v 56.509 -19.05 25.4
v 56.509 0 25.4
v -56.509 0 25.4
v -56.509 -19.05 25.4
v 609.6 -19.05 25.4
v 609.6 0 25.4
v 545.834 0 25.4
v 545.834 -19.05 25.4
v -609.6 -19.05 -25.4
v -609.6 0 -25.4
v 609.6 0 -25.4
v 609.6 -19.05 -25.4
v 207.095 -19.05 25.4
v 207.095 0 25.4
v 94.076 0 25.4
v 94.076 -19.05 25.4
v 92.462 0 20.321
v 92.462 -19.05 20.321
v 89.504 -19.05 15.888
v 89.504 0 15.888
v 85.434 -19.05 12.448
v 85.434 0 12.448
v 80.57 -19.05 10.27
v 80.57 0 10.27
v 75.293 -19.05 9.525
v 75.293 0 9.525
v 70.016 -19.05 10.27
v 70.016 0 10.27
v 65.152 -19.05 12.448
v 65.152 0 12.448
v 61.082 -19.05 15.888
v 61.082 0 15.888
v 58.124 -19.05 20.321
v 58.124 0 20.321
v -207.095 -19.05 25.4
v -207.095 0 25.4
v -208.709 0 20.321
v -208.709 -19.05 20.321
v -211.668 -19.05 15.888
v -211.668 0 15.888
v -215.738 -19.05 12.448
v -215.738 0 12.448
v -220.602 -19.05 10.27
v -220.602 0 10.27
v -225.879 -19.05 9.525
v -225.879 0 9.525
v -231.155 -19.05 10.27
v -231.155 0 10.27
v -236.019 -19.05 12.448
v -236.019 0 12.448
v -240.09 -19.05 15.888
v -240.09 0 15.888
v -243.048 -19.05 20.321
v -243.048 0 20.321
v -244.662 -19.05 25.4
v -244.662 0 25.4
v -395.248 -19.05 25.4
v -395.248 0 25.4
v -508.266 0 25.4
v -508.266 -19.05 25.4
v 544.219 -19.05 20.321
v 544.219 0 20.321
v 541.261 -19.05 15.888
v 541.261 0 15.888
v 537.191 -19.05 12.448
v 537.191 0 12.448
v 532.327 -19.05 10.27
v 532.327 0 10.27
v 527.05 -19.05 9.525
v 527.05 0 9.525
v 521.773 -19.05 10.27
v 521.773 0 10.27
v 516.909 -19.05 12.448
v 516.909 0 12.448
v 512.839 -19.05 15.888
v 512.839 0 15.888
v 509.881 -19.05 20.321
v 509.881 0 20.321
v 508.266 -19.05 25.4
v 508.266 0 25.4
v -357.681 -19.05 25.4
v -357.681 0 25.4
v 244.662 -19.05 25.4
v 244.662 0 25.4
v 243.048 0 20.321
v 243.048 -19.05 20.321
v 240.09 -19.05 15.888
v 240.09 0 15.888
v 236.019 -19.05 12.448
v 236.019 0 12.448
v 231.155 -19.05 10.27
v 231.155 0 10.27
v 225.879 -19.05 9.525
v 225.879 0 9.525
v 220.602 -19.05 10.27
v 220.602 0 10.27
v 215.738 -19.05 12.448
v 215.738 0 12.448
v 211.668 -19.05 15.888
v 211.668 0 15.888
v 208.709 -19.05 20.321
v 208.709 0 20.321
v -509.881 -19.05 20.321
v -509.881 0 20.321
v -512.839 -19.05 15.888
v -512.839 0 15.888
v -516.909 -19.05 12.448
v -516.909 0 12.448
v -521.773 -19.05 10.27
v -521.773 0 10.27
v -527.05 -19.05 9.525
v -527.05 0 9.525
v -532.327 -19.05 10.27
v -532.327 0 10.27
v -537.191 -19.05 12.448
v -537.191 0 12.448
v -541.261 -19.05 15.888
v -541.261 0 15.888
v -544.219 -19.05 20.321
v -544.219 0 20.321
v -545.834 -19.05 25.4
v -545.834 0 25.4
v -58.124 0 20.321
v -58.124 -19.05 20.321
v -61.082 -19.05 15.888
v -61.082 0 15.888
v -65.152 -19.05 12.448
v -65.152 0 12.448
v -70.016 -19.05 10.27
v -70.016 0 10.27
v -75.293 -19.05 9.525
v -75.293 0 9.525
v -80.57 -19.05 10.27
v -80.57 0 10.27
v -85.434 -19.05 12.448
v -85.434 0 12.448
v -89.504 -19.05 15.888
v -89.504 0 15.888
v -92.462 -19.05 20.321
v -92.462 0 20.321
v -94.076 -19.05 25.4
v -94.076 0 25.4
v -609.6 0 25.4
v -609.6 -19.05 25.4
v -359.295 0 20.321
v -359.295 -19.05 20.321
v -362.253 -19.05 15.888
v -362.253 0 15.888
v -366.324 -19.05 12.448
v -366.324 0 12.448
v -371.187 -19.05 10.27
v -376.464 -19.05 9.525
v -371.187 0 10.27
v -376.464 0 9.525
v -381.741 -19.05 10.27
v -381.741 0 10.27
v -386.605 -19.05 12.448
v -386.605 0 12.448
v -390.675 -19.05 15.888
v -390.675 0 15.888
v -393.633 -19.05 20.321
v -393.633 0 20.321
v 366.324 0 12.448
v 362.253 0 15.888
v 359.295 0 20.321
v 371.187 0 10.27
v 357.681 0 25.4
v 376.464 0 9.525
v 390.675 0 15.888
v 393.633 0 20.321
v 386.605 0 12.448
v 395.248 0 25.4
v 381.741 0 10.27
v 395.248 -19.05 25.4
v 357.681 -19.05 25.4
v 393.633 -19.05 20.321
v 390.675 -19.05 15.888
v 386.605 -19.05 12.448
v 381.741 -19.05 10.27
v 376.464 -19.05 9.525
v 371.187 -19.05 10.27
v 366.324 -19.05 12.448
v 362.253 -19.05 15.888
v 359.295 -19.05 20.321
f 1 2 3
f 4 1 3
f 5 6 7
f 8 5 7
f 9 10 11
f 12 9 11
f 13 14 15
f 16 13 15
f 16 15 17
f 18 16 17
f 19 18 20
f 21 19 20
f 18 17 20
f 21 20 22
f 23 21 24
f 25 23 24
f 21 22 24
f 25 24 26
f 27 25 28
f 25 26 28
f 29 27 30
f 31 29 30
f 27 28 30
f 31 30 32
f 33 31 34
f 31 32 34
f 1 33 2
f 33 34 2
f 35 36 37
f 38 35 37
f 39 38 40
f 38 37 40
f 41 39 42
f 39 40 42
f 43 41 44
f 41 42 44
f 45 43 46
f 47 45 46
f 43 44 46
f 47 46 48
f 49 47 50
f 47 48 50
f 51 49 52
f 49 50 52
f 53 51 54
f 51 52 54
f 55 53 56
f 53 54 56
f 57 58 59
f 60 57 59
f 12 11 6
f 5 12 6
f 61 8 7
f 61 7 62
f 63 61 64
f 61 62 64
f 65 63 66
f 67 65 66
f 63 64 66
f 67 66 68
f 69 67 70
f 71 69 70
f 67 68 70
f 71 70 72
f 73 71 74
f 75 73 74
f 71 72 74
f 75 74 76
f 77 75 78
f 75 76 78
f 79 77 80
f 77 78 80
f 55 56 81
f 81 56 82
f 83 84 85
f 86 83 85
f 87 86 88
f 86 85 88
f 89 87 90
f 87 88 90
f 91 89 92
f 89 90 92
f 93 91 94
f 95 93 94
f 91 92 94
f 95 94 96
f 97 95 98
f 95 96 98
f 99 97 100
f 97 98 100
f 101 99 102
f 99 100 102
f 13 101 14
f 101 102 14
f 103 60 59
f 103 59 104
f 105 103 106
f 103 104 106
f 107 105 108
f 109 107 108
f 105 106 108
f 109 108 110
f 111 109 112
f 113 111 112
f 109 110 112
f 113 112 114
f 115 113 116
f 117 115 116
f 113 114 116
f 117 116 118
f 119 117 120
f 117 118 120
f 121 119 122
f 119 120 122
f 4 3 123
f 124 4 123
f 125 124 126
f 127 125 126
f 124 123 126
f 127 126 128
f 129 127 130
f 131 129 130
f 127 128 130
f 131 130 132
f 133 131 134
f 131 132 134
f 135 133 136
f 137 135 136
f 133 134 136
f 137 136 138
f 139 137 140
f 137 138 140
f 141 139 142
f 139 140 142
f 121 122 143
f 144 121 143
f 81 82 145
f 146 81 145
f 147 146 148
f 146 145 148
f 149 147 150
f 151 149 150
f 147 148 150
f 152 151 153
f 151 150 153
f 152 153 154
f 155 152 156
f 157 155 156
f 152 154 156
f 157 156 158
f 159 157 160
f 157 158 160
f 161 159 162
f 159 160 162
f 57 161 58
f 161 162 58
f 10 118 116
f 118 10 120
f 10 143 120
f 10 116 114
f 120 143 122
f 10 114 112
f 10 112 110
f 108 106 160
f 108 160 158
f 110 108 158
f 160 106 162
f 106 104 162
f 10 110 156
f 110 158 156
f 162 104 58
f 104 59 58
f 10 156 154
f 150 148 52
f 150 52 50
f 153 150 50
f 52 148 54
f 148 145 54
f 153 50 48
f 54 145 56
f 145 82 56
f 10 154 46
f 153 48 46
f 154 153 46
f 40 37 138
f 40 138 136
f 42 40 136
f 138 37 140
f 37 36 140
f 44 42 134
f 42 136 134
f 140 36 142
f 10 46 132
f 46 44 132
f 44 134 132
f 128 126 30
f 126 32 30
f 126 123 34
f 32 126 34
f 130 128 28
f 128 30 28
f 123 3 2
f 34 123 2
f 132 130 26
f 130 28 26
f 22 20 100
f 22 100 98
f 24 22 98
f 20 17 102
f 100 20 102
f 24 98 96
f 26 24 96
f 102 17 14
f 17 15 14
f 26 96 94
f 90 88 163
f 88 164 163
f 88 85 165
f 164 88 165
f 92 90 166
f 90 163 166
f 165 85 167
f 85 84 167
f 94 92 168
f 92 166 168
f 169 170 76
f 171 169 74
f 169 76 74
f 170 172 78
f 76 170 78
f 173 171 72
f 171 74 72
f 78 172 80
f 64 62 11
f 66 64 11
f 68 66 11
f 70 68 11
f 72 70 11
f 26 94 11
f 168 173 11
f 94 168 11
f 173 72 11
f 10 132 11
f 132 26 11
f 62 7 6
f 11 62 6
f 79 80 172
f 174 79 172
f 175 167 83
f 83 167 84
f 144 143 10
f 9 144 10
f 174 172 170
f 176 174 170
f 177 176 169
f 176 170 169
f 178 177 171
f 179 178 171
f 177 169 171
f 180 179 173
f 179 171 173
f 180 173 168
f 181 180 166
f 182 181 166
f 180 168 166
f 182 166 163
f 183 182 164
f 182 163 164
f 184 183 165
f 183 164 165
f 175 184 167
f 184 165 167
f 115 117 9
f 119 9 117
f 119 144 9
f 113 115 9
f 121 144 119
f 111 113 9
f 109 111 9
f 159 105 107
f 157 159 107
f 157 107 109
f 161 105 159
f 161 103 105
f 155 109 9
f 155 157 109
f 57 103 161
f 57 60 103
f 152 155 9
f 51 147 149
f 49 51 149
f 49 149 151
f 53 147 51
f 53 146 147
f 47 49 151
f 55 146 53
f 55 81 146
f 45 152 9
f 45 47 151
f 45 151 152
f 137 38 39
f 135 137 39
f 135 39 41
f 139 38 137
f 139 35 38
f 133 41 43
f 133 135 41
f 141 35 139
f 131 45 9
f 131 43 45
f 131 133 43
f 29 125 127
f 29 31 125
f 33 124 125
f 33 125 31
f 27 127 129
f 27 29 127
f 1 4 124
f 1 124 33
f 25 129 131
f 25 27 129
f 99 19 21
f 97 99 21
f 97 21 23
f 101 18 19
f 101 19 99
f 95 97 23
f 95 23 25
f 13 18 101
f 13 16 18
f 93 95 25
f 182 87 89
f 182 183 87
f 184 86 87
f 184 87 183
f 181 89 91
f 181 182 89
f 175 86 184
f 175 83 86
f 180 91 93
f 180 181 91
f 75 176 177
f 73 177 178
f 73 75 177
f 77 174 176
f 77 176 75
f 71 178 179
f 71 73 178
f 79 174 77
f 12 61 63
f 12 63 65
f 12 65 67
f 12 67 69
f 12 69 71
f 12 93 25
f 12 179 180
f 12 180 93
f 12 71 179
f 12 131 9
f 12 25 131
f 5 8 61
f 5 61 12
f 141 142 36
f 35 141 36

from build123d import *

# Parameters (mm, degrees)
F1_DEPTH = 19.05


with BuildPart() as f1:
    # F0 (on Front) → F1 (new body)
    with BuildSketch(Plane.XZ):
        with BuildLine():
            Line((-609.6, -25.4), (609.6, -25.4))
            Line((609.6, -25.4), (609.6, 25.4))
            Line((609.6, 25.4), (545.833553, 25.4))
            ThreePointArc((545.833553, 25.4), (527.05, 9.525), (508.266447, 25.4))
            Line((508.266447, 25.4), (395.247839, 25.4))
            ThreePointArc((395.247839, 25.4), (376.464286, 9.525), (357.680732, 25.4))
            Line((357.680732, 25.4), (244.662125, 25.4))
            ThreePointArc((244.662125, 25.4), (225.878571, 9.525), (207.095018, 25.4))
            Line((207.095018, 25.4), (94.07641, 25.4))
            ThreePointArc((94.07641, 25.4), (75.292857, 9.525), (56.509304, 25.4))
            Line((56.509304, 25.4), (-56.509304, 25.4))
            ThreePointArc((-56.509304, 25.4), (-75.292857, 9.525), (-94.07641, 25.4))
            Line((-94.07641, 25.4), (-207.095018, 25.4))
            ThreePointArc((-207.095018, 25.4), (-225.878571, 9.525), (-244.662125, 25.4))
            Line((-244.662125, 25.4), (-357.680732, 25.4))
            ThreePointArc((-357.680732, 25.4), (-376.464286, 9.525), (-395.247839, 25.4))
            Line((-395.247839, 25.4), (-508.266447, 25.4))
            ThreePointArc((-508.266447, 25.4), (-527.05, 9.525), (-545.833553, 25.4))
            Line((-545.833553, 25.4), (-609.6, 25.4))
            Line((-609.6, 25.4), (-609.6, -25.4))
        make_face()
    extrude(amount=F1_DEPTH)


solid = f1.part
